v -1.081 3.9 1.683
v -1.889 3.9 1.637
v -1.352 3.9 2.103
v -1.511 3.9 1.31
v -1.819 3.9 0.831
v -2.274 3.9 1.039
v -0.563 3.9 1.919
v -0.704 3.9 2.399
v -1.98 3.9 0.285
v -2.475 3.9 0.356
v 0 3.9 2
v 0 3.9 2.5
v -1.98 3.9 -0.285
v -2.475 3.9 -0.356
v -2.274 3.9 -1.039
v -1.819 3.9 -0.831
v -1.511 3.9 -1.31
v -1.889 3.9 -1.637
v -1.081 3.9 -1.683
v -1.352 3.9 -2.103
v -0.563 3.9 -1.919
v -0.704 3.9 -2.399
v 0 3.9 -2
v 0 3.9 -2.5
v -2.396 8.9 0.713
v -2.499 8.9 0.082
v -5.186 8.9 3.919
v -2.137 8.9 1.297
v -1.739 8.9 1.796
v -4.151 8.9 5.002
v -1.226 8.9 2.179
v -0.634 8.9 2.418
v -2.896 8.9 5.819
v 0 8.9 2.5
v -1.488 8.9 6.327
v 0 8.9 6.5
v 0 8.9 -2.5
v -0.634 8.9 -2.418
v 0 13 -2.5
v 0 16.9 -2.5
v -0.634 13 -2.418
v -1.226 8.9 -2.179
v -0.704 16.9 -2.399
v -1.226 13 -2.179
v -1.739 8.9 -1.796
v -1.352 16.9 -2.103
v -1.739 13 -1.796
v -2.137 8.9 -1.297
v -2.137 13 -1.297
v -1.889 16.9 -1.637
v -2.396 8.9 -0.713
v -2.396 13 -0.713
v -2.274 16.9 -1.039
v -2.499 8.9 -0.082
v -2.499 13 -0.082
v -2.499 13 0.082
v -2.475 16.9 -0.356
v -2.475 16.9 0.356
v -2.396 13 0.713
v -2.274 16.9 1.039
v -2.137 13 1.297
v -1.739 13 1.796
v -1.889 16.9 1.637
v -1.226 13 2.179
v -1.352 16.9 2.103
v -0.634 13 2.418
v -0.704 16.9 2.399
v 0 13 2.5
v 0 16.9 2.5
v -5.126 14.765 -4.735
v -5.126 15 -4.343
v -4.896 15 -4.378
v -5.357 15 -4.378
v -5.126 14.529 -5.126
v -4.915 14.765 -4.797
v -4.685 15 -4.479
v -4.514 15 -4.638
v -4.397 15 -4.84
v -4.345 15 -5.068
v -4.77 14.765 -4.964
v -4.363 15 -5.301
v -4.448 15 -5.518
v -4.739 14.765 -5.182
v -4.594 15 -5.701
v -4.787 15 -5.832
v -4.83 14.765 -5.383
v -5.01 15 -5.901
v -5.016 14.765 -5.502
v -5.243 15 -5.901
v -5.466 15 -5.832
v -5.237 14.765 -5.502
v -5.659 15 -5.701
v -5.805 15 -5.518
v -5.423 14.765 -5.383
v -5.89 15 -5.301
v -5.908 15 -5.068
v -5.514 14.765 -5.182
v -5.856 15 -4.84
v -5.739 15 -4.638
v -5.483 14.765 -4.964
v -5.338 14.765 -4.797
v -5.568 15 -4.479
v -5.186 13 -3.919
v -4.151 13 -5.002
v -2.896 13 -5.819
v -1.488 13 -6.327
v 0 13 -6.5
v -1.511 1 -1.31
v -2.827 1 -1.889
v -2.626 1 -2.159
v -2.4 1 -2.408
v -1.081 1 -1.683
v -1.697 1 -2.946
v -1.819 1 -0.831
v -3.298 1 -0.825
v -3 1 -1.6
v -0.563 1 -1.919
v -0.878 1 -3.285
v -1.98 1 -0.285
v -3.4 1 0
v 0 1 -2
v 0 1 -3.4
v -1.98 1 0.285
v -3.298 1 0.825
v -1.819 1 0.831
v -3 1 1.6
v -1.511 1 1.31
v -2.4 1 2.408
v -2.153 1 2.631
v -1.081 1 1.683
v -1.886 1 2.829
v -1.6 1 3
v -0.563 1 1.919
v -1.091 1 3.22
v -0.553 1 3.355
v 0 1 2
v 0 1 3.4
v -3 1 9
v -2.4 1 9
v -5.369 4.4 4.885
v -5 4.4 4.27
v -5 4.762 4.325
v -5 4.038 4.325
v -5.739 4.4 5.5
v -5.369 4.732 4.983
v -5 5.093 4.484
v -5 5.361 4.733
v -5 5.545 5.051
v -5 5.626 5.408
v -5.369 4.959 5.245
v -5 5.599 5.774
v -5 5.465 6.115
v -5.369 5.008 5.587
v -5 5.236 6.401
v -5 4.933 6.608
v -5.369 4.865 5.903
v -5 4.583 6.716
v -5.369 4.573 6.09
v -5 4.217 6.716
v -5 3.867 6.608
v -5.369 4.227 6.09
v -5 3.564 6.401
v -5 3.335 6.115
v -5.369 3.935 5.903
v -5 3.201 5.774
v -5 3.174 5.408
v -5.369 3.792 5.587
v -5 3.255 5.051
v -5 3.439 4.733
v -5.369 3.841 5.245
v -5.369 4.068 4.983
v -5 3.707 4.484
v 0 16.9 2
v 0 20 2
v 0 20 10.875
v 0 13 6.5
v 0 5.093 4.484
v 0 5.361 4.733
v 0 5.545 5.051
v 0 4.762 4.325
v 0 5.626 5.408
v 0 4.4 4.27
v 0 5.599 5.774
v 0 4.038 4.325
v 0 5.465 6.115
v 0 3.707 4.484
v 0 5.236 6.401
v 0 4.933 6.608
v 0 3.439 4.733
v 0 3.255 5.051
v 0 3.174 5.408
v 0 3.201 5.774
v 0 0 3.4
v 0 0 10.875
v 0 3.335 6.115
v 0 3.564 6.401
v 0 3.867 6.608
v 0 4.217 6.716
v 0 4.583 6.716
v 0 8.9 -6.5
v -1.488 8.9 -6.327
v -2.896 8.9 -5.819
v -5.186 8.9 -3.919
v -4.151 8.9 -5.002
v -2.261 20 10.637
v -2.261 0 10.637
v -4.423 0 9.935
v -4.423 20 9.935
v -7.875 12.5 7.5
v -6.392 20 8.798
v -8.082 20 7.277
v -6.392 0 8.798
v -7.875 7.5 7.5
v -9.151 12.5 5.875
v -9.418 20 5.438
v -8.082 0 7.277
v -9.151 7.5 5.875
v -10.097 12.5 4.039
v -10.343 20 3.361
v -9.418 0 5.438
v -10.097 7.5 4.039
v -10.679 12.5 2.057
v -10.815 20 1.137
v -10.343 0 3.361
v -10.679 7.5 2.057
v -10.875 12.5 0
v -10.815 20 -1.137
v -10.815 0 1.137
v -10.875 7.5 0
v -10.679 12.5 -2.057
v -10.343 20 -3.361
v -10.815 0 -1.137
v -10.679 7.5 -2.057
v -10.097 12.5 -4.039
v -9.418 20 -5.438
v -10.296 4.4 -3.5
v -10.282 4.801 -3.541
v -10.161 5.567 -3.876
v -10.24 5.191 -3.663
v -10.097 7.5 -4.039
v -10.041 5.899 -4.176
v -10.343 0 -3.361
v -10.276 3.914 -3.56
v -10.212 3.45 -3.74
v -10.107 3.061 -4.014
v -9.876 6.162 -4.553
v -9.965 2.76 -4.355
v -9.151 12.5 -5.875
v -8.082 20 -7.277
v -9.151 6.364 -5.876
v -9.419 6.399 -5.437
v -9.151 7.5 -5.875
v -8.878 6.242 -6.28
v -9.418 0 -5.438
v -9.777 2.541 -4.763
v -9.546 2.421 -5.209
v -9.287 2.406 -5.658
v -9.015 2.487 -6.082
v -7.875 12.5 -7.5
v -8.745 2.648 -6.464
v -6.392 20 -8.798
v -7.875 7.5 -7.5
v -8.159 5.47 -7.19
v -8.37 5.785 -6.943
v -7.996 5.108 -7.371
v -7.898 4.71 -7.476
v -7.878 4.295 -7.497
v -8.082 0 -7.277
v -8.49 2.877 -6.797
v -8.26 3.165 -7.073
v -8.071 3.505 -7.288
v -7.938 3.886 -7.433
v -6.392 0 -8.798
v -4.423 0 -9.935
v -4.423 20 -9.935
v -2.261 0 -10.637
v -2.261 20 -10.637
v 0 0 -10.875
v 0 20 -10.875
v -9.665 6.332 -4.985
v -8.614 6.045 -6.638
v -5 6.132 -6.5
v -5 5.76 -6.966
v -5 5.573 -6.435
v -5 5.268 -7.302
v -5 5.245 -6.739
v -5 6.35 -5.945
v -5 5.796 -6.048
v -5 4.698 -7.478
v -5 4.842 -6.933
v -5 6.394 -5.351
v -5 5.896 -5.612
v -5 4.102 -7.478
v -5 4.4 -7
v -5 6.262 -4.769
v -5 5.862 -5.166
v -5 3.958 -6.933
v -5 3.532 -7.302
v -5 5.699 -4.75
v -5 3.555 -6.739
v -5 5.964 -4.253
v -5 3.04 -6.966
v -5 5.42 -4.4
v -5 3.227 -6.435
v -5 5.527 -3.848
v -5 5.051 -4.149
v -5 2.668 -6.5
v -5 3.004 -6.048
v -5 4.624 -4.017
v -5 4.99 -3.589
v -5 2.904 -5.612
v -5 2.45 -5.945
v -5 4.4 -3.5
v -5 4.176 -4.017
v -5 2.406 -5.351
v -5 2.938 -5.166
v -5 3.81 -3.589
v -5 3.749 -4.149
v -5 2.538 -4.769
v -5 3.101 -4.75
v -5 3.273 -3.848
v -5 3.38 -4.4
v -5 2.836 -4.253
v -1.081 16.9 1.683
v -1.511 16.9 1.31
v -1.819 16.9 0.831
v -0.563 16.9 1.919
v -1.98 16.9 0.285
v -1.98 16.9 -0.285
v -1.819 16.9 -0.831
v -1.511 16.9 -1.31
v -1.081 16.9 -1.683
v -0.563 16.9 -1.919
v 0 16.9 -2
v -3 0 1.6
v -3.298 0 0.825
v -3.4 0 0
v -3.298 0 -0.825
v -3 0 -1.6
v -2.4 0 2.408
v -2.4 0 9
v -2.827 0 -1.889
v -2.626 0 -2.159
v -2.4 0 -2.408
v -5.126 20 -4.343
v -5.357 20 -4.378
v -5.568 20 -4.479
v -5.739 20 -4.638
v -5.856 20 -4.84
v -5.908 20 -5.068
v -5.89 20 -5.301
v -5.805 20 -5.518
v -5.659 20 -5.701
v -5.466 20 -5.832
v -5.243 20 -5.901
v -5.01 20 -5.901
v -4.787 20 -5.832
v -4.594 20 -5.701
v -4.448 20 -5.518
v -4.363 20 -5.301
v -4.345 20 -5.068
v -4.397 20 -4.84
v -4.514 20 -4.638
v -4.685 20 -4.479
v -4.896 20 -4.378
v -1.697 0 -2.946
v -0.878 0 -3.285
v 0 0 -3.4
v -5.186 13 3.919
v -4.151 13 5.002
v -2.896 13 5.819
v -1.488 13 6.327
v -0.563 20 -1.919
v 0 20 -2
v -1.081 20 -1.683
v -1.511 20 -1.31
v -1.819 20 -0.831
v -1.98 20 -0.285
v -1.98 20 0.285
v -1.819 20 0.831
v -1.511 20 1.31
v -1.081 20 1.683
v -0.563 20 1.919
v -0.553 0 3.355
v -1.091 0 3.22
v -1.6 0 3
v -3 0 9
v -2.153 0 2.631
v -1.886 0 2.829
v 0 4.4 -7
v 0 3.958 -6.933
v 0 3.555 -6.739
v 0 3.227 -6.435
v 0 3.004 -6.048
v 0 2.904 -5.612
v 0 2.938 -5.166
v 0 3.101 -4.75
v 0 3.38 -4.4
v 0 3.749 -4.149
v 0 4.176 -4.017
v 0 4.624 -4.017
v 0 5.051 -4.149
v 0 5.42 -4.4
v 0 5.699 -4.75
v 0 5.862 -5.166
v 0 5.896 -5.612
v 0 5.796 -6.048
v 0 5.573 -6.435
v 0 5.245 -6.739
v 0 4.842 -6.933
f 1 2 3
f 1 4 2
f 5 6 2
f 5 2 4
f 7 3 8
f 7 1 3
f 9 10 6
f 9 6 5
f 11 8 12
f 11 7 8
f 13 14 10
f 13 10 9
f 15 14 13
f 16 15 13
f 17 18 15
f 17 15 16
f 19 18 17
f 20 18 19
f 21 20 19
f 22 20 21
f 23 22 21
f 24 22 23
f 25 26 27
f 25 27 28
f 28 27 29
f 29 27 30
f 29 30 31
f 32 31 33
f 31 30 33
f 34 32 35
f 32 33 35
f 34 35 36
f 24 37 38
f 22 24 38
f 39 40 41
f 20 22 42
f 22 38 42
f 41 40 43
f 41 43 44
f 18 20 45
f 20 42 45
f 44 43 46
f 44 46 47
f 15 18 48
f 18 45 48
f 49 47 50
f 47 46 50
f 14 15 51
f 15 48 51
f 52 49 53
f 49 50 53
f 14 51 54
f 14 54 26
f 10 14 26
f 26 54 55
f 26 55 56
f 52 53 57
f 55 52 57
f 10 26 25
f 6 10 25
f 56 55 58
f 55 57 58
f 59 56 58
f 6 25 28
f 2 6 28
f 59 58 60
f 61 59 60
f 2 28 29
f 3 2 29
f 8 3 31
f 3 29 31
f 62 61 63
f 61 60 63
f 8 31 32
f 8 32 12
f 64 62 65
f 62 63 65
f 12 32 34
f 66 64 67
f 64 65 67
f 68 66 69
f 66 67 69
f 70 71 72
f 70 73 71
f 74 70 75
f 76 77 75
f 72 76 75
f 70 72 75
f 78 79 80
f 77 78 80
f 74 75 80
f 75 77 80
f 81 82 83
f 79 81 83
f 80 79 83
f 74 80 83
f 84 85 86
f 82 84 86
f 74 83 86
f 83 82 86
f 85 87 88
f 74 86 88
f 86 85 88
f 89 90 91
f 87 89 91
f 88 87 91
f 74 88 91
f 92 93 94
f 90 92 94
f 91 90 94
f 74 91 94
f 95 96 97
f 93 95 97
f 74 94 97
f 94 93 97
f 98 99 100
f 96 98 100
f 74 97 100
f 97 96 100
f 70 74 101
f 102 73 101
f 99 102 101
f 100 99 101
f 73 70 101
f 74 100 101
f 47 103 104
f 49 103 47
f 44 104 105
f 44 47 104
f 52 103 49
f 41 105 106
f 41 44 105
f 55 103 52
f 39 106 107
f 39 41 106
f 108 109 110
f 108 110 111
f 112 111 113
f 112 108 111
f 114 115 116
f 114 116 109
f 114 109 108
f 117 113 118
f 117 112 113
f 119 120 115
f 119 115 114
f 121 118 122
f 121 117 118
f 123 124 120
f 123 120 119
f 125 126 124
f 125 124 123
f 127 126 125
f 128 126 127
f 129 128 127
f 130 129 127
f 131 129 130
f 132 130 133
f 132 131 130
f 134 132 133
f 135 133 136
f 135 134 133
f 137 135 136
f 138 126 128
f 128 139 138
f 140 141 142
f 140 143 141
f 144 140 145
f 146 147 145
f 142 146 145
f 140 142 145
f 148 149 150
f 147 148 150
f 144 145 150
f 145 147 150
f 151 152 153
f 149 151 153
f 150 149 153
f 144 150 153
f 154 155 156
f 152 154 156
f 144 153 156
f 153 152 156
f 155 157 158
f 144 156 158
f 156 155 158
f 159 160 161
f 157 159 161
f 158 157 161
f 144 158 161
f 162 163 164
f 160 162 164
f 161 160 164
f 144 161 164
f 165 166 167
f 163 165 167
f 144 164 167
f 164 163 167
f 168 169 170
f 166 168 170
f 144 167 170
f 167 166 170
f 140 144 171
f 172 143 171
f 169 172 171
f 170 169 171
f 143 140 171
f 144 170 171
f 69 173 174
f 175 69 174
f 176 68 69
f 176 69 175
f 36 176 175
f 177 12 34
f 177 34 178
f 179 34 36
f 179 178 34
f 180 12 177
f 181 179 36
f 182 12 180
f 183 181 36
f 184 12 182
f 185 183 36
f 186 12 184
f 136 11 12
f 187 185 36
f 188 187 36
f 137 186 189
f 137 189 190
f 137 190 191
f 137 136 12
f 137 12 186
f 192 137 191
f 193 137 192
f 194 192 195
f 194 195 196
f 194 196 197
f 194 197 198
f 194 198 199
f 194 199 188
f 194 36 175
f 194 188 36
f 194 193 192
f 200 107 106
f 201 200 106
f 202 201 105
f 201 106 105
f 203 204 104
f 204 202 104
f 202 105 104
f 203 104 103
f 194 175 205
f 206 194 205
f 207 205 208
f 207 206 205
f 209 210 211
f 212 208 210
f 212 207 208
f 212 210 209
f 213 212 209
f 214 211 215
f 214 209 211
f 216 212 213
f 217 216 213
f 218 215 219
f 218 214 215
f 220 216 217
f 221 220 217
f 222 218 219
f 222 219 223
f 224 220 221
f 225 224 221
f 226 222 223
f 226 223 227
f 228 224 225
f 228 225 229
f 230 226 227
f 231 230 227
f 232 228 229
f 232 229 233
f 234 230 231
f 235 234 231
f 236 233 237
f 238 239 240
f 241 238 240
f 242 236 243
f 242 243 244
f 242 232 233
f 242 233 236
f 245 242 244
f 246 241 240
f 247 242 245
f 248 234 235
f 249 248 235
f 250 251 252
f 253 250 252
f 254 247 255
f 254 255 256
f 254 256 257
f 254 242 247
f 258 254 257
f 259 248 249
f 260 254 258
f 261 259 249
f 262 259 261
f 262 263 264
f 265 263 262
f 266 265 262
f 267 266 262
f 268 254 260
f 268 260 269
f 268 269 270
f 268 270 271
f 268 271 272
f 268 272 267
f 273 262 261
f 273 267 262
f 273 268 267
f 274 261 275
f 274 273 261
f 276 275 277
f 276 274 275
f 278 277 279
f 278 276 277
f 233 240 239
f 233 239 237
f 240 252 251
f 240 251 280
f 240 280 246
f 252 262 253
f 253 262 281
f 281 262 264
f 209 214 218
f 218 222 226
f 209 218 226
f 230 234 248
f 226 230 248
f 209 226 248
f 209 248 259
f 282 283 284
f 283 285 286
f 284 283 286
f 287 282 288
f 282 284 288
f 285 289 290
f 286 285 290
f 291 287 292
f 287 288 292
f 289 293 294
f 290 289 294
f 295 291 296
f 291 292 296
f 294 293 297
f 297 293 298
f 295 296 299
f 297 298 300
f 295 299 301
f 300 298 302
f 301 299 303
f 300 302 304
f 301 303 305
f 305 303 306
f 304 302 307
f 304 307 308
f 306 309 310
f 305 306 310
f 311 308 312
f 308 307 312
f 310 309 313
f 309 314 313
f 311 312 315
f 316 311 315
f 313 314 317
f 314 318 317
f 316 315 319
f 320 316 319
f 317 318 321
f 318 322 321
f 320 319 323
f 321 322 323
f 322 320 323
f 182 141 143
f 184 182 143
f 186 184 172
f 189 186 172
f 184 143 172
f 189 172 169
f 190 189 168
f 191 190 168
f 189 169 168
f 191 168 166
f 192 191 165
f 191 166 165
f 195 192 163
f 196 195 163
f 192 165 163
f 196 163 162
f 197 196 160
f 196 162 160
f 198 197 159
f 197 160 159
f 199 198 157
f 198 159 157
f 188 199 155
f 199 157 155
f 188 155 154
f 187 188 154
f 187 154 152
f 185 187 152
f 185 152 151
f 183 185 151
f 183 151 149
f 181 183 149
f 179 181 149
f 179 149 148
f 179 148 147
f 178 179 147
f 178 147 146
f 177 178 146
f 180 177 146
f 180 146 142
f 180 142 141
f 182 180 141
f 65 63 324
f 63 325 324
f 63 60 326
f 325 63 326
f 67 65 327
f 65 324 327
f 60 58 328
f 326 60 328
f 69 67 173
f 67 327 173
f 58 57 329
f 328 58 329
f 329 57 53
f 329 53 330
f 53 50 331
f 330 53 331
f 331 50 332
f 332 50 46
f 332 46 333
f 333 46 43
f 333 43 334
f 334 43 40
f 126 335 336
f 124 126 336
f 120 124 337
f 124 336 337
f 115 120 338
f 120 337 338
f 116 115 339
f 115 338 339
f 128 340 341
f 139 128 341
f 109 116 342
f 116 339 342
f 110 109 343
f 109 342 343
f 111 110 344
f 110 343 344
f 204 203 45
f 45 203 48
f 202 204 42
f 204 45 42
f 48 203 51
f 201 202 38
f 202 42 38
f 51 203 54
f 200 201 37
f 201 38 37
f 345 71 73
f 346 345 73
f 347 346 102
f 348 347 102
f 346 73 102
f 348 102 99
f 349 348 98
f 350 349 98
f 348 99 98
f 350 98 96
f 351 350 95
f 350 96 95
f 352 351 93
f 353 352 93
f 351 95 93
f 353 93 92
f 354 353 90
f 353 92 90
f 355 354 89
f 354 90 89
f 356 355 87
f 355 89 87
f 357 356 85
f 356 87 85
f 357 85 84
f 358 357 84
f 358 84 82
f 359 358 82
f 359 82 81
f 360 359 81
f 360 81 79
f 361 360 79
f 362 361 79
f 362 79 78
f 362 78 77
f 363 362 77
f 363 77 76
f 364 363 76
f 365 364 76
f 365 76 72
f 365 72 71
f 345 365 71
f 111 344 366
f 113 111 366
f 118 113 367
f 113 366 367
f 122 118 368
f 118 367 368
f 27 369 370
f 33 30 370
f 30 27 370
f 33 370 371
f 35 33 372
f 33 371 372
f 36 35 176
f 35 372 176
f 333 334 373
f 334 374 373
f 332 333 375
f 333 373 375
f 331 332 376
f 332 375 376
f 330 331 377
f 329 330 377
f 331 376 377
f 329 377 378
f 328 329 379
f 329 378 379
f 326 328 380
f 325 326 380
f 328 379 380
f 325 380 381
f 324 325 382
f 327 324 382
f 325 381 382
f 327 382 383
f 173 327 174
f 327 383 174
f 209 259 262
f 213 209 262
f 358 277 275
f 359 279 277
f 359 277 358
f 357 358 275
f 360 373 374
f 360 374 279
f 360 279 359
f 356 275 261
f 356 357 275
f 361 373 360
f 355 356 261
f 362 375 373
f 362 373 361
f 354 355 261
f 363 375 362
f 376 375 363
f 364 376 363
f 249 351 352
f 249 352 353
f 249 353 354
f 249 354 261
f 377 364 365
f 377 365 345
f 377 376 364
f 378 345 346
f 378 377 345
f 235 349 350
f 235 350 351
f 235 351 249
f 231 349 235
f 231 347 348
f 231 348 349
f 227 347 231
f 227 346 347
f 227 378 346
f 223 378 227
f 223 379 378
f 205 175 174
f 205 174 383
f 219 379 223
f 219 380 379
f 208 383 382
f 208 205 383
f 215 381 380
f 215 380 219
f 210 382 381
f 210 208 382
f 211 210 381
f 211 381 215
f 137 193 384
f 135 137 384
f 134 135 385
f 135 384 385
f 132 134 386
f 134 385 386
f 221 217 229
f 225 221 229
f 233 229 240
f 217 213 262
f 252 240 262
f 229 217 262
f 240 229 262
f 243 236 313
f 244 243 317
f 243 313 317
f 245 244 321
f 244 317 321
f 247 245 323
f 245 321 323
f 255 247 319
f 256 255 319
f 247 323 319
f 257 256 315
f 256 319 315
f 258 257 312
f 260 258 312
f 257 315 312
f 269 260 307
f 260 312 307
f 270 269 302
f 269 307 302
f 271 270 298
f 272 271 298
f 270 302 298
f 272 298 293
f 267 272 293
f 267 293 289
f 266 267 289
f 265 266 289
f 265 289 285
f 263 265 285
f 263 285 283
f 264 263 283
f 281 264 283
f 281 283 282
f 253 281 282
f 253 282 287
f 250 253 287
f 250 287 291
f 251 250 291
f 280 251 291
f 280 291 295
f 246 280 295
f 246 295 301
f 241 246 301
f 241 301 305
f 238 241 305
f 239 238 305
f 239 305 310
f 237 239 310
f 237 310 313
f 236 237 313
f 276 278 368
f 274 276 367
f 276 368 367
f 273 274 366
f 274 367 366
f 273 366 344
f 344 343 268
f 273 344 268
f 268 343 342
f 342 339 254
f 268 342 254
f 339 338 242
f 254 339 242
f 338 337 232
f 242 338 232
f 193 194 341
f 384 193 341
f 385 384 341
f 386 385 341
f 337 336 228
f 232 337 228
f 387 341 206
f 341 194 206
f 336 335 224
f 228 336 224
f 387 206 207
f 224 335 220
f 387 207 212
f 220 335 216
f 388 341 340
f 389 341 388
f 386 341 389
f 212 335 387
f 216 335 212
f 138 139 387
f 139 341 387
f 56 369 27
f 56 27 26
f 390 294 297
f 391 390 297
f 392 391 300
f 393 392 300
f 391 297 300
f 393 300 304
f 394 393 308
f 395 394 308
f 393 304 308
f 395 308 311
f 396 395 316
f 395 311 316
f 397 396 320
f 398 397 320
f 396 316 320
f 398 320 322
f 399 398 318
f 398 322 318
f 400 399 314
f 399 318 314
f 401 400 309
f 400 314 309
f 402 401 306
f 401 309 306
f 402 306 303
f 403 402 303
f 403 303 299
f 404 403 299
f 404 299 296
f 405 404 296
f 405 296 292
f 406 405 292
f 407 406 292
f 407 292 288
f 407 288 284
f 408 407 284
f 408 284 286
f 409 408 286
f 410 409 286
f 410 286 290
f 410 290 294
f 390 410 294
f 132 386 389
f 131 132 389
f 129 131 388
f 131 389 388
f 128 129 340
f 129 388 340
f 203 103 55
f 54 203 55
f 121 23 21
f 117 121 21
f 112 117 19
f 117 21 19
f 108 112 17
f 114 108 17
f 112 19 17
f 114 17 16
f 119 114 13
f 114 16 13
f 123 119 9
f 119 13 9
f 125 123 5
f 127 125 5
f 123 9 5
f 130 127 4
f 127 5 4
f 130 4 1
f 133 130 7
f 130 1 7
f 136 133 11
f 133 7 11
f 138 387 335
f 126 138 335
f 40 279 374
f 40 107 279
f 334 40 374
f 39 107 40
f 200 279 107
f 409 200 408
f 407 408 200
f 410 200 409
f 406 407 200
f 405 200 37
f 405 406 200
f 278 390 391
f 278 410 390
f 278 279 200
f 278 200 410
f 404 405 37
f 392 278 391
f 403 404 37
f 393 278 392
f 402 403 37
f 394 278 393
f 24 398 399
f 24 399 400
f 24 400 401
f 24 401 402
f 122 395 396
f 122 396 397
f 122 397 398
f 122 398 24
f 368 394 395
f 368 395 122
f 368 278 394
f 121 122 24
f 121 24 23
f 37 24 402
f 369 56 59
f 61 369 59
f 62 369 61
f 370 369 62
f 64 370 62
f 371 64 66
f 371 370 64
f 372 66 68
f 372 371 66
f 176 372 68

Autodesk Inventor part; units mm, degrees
ref_plane "YZ Plane" through (0, 0, 0) normal (1, 0, 0) x (0, 1, 0)
sketch "Sketch1" plane through (0, 0, 0) normal (0, 1, 0) x (-1, 0, 0)
  arc A0 (0, -10.875) -> (0, 10.875) centre (0, 0) ccw
  line L0 (0, -10.875) -> (0, 10.875)
  dimension "d0" = 21.75
extrude "Extrusion1" add sketch "Sketch1" along normal blind 20
sketch "Sketch2" plane through (0, 20, 0) normal (0, 1, 0) x (1, 0, 0)
  circle A0 centre (0, 0) radius 2
  dimension "d3" = 4
extrude "Extrusion2" cut sketch "Sketch2" against normal through all
ref_plane "Work Plane1" through (0, 13, 0) normal (0, -1, 0) x (1, 0, 0)
sketch "Sketch3" plane through (0, 13, 0) normal (0, -1, 0) x (1, 0, 0)
  line L0 (-2, -7.5208) -> (2, -7.5208) construction
  line L1 (2, -7.5208) -> (2, 8.0151) construction
  line L2 (2, 8.0151) -> (-2, 8.0151) construction
  line L3 (-2, 8.0151) -> (-2, -7.5208) construction
  line L4 (2.6754, -7.3078) -> (5.9521, -5.0135) construction
  line L5 (5.9521, -5.0135) -> (-2.959, 7.7128) construction
  line L6 (-2.959, 7.7128) -> (-6.2356, 5.4185) construction
  line L7 (-6.2356, 5.4185) -> (2.6754, -7.3078) construction
  line L8 (5.9521, 5.0135) -> (2.6754, 7.3078) construction
  line L9 (2.6754, 7.3078) -> (-6.2356, -5.4185) construction
  line L10 (-6.2356, -5.4185) -> (-2.959, -7.7128) construction
  line L11 (-2.959, -7.7128) -> (5.9521, 5.0135) construction
  line L12 (-5.1857, 3.919) -> (-2.4415, 0)
  line L13 (-5.1857, -3.919) -> (-2.4415, 0)
  line L14 (0, 10.875) -> (0, 2) projected
  line L15 (0, 6.4375) -> (0, -6.5)
  arc A0 (1.9091, -6.2133) -> (2, -6.1847) centre (0, 0) ccw
  arc A1 (2, 6.1847) -> (1.9091, 6.2133) centre (0, 0) ccw
  arc A2 (0, 6.5) -> (-5.1857, 3.919) centre (0, 0) ccw
  arc A3 (-5.1857, -3.919) -> (0, -6.5) centre (0, 0) ccw
  point P0 (2, 7.5208)
  point P1 (-2, -8.0151)
  dimension "d29" = 4
  dimension "d32" = 35
  dimension "d36" = 145
extrude "Extrusion3" cut sketch "Sketch3" along normal blind 4.1
sketch "Sketch4" plane through (0, 20, 0) normal (0, 1, 0) x (1, 0, 0)
  line L0 (0, 0) -> (-10.2573, 10.2573) construction
  line L1 (0, 0) -> (14.5061, 0) construction
  point P0 (-5.1265, 5.1265)
  dimension "d38" = 7.25
  dimension "d39" = 225
hole "Hole1" at (-5.1265, 20, -5.1265) direction (0, -1, 0) diameter 1.567 depth 5 tip angle 118 thread size "M2x0.4" class "6H" standard "ISO Metric profile"
sketch "Sketch5" plane through (0, 0, 10.875) normal (1, 0, 0) x (0, 0, -1)
  line L0 (8.875, 8.9) -> (4.375, 8.9) projected
  line L1 (8.875, 0) -> (8.875, 8.9) projected
  point P0 (10.875, 0)
  point P1 (5.375, 4.4)
  dimension "d47" = 4.5
  dimension "d50" = 3.5
hole "Hole2" at (0, 4.4, 5.5) direction (-1, 0, 0) diameter 2.459 depth 5 tip angle 118 thread size "M3x0.5" class "6H" standard "ISO Metric profile"
sketch "Sketch6" plane through (0, 0, -10.875) normal (1, 0, 0) x (0, 0, -1)
  line L0 (-8.875, 8.9) -> (-8.875, 0) projected
  line L1 (-4.375, 8.9) -> (-8.875, 8.9) projected
  point P0 (-10.875, 0)
  point P1 (-5.375, 4.4)
  dimension "d58" = 3.5
  dimension "d59" = 4.5
hole "Hole3" at (0, 4.4, -5.5) direction (-1, 0, 0) diameter 3 end through all
ref_plane "Work Plane2" through (-11, 0, -10.875) normal (1, 0, 0) x (0, 0, -1)
sketch "Sketch7" plane through (-11, 0, -10.875) normal (1, 0, 0) x (0, 0, -1)
  circle A0 centre (-5.375, 4.4) radius 1.5 projected
  point P0 (-10.875, 0)
hole "Hole4" at (-11, 4.4, -5.5) direction (1, 0, 0) diameter 3 end through all counterbore diameter 4 counterbore depth 6
sketch "Sketch8" plane through (0, 0, 0) normal (0, -1, 0) x (1, 0, 0)
  circle A0 centre (0, 0) radius 2.7 construction
  line L0 (0, 3) -> (0, 2.4) construction
  line L1 (0, 6.5) -> (0, 2) projected
  arc A1 (-3, 1.6) -> (-3, -1.6) centre (0, 0) ccw
  arc A2 (-2.4, -2.4083) -> (-1.6, 3) centre (0, 0) ccw
  line L2 (-2.4, 9) -> (-3, 9)
  line L3 (-3, 9) -> (-3, 1.6)
  arc A3 (-3, 1.6) -> (-2.4, 2.4083) centre (0, 0) ccw
  arc A4 (-2.4, -2.4083) -> (-2.4, 2.4083) centre (0, 0) ccw
  arc A5 (-3, 1.6) -> (-3, -1.6) centre (0, 0) ccw
  line L4 (-2.4, 2.4083) -> (-2.4, 9)
  point P0 (0, 2.7)
  dimension "d76" = 5.4
  dimension "d80" = 0
  dimension "d88" = 0.6
  dimension "d89" = 9
extrude "Extrusion4" cut sketch "Sketch8" against normal blind 1
sketch "Sketch9" plane through (0, 8.9, 0) normal (0, 1, 0) x (1, 0, 0)
  circle A0 centre (0, 0) radius 2.5
  dimension "d90" = 5
extrude "Extrusion5" cut sketch "Sketch9" against normal blind 5 and the other way blind 8
sketch "Sketch10" plane through (0, 0, 0) normal (0, 0, 1) x (1, 0, 0)
  line L0 (-10.875, 0) -> (-10.875, 20) projected
  line L1 (-10.875, 12.5) -> (-7.875, 12.5)
  line L2 (-7.875, 12.5) -> (-7.875, 7.5)
  line L3 (-7.875, 7.5) -> (-10.875, 7.5)
  line L4 (-10.875, 7.5) -> (-10.875, 12.5)
  line L5 (0, 20) -> (-10.875, 20) projected
  point P0 (0, 0)
  dimension "d95" = 3
  dimension "d96" = 7.5
  dimension "d97" = 5
extrude "Extrusion6" cut sketch "Sketch10" along normal through all both and the other way through all
properties part number "HalfEncoderSupprt"
